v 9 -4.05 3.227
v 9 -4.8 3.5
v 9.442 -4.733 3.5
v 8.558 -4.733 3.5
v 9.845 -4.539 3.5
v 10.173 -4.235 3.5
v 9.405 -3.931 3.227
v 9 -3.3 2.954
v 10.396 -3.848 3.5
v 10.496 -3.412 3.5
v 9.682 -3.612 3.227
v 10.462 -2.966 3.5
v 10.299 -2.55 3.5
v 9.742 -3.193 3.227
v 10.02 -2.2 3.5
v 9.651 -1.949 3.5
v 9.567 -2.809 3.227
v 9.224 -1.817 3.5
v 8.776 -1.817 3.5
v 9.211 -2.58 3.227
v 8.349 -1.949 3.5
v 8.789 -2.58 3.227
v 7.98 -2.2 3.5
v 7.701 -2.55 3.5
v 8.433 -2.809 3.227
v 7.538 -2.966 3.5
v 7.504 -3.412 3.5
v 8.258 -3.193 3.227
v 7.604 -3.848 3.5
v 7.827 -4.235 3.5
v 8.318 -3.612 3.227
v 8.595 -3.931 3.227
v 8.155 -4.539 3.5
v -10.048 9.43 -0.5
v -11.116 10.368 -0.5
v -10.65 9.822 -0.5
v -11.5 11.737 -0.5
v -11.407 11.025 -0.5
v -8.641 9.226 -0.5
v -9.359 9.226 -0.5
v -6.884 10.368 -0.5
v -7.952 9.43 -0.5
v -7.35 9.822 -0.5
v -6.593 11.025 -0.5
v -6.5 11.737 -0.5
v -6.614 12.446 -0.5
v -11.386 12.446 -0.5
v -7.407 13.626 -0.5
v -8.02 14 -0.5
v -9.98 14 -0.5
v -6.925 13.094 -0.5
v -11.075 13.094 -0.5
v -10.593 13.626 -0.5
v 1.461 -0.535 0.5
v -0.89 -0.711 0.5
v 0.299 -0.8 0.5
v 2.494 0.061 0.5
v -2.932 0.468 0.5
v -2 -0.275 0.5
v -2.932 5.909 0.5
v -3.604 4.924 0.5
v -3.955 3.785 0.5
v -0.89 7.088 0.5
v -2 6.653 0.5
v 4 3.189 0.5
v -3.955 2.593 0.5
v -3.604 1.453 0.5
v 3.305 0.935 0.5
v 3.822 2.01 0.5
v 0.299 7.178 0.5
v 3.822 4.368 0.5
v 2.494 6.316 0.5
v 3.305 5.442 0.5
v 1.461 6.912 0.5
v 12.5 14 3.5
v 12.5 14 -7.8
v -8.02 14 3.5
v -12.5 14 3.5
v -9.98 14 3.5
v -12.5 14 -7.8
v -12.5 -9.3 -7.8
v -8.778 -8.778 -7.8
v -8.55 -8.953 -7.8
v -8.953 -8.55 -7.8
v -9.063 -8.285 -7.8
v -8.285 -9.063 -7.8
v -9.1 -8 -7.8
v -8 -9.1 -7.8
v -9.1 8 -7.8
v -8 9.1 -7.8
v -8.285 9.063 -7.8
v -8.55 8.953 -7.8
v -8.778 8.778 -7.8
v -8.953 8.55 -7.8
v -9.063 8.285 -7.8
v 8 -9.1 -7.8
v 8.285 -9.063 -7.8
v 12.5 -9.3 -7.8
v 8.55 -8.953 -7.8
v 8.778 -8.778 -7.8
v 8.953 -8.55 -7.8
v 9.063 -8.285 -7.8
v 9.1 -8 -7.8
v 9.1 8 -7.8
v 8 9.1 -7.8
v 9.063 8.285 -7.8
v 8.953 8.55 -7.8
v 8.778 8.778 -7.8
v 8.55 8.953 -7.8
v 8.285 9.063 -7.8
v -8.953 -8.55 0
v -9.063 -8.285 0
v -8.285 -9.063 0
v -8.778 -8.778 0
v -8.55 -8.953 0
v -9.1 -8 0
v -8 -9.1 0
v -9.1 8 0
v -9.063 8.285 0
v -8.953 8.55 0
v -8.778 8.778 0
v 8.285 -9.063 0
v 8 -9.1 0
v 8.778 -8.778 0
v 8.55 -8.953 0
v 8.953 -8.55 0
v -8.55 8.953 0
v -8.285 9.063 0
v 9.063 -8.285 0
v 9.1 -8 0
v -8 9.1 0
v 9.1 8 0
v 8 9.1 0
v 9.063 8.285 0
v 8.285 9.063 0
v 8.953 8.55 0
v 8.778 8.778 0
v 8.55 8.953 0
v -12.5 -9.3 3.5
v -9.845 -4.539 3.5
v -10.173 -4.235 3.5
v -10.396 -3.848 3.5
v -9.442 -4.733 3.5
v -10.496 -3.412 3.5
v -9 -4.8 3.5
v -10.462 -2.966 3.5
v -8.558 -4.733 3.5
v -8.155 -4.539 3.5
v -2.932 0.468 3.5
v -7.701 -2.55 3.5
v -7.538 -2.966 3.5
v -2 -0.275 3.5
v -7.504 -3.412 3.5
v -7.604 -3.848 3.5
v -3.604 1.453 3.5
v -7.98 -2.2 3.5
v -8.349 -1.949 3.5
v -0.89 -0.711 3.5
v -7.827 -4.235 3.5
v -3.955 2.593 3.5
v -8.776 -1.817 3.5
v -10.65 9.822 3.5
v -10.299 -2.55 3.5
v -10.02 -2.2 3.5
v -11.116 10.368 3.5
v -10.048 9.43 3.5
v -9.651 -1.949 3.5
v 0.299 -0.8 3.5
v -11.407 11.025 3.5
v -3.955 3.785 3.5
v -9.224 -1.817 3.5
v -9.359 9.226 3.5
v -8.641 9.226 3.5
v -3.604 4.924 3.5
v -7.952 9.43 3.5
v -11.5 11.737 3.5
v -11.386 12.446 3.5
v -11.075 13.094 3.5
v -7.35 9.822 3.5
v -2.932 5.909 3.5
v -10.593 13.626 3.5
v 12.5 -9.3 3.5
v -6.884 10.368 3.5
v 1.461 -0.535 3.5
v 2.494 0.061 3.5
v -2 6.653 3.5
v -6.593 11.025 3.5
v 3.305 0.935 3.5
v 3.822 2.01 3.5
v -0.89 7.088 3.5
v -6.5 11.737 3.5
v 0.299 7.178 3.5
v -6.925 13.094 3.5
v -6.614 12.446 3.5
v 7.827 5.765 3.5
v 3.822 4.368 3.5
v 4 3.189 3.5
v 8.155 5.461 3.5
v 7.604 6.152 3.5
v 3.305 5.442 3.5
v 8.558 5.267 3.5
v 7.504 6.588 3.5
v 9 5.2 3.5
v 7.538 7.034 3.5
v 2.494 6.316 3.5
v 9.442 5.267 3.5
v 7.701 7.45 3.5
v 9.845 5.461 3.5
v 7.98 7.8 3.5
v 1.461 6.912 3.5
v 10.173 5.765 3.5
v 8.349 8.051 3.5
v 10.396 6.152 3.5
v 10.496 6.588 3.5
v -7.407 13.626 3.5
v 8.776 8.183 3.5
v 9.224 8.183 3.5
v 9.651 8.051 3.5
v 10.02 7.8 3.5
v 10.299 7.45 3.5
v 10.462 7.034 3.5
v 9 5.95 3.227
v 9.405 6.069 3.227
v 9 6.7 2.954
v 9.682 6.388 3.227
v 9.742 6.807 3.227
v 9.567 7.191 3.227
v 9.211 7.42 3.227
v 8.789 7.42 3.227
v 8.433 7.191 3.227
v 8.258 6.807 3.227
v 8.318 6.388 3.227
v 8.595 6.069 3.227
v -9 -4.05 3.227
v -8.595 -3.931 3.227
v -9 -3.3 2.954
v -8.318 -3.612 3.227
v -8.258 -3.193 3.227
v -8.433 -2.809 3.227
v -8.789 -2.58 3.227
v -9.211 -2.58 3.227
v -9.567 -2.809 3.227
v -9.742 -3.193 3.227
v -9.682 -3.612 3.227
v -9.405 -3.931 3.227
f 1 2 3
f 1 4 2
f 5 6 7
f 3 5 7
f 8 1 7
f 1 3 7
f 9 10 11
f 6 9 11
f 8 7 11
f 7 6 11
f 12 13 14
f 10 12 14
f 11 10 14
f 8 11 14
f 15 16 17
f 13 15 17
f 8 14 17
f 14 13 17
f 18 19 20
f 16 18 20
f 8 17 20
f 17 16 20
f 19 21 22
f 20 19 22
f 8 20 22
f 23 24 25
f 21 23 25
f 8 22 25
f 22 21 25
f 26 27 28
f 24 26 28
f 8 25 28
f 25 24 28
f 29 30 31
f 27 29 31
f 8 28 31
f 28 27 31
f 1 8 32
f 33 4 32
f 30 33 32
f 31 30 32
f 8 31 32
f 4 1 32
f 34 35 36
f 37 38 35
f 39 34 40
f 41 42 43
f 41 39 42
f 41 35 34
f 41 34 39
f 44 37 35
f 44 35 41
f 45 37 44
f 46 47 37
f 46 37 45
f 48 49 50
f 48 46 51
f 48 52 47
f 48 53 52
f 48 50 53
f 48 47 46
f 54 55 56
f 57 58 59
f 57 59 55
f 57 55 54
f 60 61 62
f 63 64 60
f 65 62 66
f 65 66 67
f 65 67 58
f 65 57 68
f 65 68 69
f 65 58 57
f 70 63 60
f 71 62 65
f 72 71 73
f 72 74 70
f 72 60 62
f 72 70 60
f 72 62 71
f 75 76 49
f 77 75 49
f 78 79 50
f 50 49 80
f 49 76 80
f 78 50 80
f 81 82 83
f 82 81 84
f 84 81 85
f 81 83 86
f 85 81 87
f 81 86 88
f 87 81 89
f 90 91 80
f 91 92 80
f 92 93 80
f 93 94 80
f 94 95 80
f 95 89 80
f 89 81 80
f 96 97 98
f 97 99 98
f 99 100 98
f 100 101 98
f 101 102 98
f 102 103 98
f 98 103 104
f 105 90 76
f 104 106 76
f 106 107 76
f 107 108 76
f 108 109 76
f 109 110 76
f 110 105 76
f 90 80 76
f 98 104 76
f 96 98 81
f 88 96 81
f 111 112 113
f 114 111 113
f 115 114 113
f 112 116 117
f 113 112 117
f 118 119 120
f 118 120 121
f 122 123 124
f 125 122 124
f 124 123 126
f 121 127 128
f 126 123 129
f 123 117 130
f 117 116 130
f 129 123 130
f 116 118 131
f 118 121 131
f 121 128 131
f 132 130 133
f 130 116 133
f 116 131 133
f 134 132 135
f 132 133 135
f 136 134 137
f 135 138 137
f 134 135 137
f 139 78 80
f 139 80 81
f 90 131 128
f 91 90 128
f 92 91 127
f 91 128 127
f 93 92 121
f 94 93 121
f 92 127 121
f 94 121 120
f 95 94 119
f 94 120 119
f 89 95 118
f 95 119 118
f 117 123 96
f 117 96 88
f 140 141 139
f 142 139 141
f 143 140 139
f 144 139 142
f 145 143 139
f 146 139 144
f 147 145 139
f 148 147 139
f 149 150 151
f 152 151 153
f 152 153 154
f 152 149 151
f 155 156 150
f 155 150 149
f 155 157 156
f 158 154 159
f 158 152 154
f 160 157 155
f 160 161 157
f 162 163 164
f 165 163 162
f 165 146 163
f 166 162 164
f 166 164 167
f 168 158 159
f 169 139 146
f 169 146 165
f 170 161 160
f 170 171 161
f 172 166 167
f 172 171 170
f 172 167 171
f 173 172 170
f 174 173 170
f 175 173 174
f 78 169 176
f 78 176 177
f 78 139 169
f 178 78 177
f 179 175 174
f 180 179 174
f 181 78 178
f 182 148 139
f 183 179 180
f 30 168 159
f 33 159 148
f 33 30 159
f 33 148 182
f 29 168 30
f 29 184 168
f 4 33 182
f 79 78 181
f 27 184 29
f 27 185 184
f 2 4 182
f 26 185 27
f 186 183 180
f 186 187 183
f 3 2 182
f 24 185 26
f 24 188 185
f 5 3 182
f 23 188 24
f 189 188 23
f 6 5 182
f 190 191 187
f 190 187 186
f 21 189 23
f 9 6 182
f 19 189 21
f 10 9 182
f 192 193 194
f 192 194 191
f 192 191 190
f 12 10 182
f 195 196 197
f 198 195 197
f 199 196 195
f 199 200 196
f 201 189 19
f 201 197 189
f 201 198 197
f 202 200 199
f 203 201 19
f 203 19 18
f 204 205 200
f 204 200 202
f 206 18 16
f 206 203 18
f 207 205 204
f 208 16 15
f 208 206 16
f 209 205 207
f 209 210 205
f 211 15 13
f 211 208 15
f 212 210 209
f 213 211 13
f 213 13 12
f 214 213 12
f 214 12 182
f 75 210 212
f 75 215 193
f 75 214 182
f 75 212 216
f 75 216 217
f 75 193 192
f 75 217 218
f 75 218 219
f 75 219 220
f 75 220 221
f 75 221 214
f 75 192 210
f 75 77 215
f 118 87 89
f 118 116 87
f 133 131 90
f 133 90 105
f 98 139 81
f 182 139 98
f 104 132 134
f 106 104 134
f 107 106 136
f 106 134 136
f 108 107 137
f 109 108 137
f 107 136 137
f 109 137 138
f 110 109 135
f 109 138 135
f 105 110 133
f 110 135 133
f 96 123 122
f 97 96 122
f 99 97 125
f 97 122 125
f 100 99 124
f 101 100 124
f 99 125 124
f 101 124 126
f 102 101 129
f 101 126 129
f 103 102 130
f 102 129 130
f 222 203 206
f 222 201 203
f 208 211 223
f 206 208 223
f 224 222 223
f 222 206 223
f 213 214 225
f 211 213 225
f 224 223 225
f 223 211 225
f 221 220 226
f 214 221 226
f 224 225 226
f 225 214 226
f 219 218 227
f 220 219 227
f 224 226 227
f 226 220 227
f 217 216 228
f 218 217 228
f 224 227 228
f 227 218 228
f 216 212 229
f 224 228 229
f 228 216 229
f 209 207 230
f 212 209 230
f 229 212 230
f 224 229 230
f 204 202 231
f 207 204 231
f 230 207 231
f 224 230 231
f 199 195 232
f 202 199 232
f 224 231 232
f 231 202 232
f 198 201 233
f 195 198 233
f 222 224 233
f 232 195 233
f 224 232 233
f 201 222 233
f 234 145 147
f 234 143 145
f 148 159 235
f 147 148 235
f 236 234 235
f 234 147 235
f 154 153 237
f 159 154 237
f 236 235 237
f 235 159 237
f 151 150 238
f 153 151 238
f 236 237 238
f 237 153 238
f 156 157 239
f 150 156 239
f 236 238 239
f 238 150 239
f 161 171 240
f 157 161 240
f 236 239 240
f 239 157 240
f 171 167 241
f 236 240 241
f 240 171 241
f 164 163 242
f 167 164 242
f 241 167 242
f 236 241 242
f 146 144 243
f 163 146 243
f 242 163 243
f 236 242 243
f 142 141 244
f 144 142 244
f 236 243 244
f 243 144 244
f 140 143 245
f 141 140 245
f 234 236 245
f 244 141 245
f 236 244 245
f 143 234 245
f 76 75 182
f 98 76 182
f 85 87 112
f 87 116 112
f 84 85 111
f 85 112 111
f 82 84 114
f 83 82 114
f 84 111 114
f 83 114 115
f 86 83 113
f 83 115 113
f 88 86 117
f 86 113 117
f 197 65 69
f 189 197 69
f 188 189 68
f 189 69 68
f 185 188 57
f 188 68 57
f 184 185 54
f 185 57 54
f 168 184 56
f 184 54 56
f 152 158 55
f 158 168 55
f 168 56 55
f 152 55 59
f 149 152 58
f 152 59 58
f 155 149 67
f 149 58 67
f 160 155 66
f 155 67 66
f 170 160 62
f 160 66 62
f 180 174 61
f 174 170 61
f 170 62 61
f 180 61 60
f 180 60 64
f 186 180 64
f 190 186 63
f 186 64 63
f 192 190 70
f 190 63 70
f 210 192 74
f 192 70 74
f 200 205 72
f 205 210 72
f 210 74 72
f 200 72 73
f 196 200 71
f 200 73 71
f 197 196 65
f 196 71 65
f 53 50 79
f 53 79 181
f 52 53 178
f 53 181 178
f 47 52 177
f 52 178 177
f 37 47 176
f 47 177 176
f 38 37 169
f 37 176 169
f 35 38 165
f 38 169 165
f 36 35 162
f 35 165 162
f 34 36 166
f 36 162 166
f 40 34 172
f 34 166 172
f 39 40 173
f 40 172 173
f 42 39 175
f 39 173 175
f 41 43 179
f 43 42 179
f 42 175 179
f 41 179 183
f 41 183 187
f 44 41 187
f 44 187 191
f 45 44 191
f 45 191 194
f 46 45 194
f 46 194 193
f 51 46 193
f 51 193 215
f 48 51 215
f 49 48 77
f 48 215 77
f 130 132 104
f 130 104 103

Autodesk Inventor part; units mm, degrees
ref_plane "YZ Plane" through (0, 0, 0) normal (1, 0, 0) x (0, 1, 0)
ref_plane "XZ Plane" through (0, 0, 0) normal (0, 1, 0) x (-1, 0, 0)
sketch "Skizze1" plane through (0, 0, 0) normal (0, 0, 1) x (1, 0, 0)
  arc A0 (-9, -8) -> (-8, -9) centre (-8, -8) ccw projected
  line L0 (8, -9) -> (-8, -9) projected
  arc A1 (8, -9) -> (9, -8) centre (8, -8) ccw projected
  line L1 (9, 8) -> (9, -8) projected
  arc A2 (9, 8) -> (8, 9) centre (8, 8) ccw projected
  line L2 (-8, 9) -> (8, 9) projected
  arc A3 (-8, 9) -> (-9, 8) centre (-8, 8) ccw projected
  line L3 (-9, -8) -> (-9, 8) projected
  circle A4 centre (0, 0) radius 5.8 projected
  arc A5 (-8, 9.1) -> (-9.1, 8) centre (-8, 8) ccw
  line L4 (-8, 9.1) -> (8, 9.1)
  arc A6 (9.1, 8) -> (8, 9.1) centre (8, 8) ccw
  line L5 (9.1, 8) -> (9.1, -8)
  arc A7 (8, -9.1) -> (9.1, -8) centre (8, -8) ccw
  line L6 (8, -9.1) -> (-8, -9.1)
  arc A8 (-9.1, -8) -> (-8, -9.1) centre (-8, -8) ccw
  line L7 (-9.1, -8) -> (-9.1, 8)
  line L8 (14, 14) -> (-14, 14)
  line L9 (-14, 14) -> (-14, -14)
  line L10 (-14, -14) -> (14, -14)
  line L11 (14, -14) -> (14, 14)
  line L12 (14, 14) -> (-14, -14) construction
  line L13 (-14, 14) -> (14, -14) construction
  point P0 (0, 0)
  dimension "d0" = 0.1
  dimension "d1" = 28
  dimension "d2" = 28
ref_plane "Arbeitsebene1" through (-9, -9, -7.8) normal (0, 0, -1) x (0, 1, 0)
extrude "Extrusion1" add sketch "Skizze1" against normal up to surface (7.8 mm away) contours L11 L10 L9 L8
sketch "Skizze2" plane through (0, 0, 0) normal (0, 0, 1) x (1, 0, 0)
  line L0 (-14, 14) -> (-14, -14) projected
  line L1 (-14, -14) -> (14, -14) projected
  line L2 (14, -14) -> (14, 14) projected
  line L3 (14, 14) -> (-14, 14) projected
  line L4 (9.1, 8) -> (9.1, -8) projected
  arc A0 (8, -9.1) -> (9.1, -8) centre (8, -8) ccw projected
  line L5 (8, -9.1) -> (-8, -9.1) projected
  arc A1 (-9.1, -8) -> (-8, -9.1) centre (-8, -8) ccw projected
  line L6 (-9.1, -8) -> (-9.1, 8) projected
  arc A2 (-8, 9.1) -> (-9.1, 8) centre (-8, 8) ccw projected
  line L7 (-8, 9.1) -> (8, 9.1) projected
  arc A3 (9.1, 8) -> (8, 9.1) centre (8, 8) ccw projected
  line L8 (-7.6, 7.6) -> (-7.6, -7.6)
  line L9 (-7.6, -7.6) -> (7.6, -7.6)
  line L10 (7.6, -7.6) -> (7.6, 7.6)
  line L11 (7.6, 7.6) -> (-7.6, 7.6)
  point P0 (0, 0)
  dimension "d5" = 1.5
extrude "Extrusion2" add sketch "Skizze2" along normal blind 0.5 contours L3 L2 L1 L0 | L4 A0 L5 A1 L6 A2 L7 A3 | L11 L10 L9 L8
sketch "Skizze3" plane through (0, 0, 0.5) normal (0, 0, 1) x (1, 0, 0)
  line L0 (-14, -14) -> (14, -14) projected
  line L1 (14, -14) -> (14, 14) projected
  line L2 (14, 14) -> (-14, 14) projected
  line L3 (-14, 14) -> (-14, -14) projected
  circle A0 centre (0, 3.1887) radius 4
  dimension "d8" = 8
extrude "Extrusion3" add sketch "Skizze3" along normal blind 3
sketch "Skizze4" plane through (0, 0, 3.5) normal (0, 0, 1) x (1, 0, 0)
  line L0 (14, -14) -> (14, 14) projected
  line L1 (14, 14) -> (-14, 14) projected
  line L2 (-14, 14) -> (-14, -14) projected
  line L3 (-14, -14) -> (14, -14) projected
  circle A0 centre (0, 3.1887) radius 4 projected
  line L4 (5, -10.8) -> (-5, -10.8) projected
  line L5 (-14, 14) -> (-14, -14) projected
  line L6 (14, -14) -> (-14, -14)
  line L7 (-14, -14) -> (-14, -9.3)
  line L8 (-14, -9.3) -> (14, -9.3)
  line L9 (14, -9.3) -> (14, -14)
  line L10 (-14, 14) -> (-12.5, 14)
  line L11 (-12.5, 14) -> (-12.5, -9.3)
  line L12 (-12.5, -9.3) -> (-14, -9.3)
  line L13 (-14, -9.3) -> (-14, 14)
  line L14 (14, -14) -> (14, 14) projected
  line L15 (14, 14) -> (12.5, 14)
  line L16 (12.5, 14) -> (12.5, -9.3)
  line L17 (12.5, -9.3) -> (14, -9.3)
  line L18 (14, -9.3) -> (14, 14)
  point P0 (0, 0)
  point P1 (14, -9.3)
  point P2 (12.5, 14)
  dimension "d11" = 1.5
  dimension "d22" = 1.5
  dimension "d23" = 1.5
extrude "Extrusion4" cut sketch "Skizze4" against normal through all contours L3 L2 L8 L0 | L8 L16 L1 L0 | L2 L1 L11 L8
sketch "Skizze5" plane through (0, 0, 3.5) normal (0, 0, 1) x (1, 0, 0)
  circle A0 centre (-9, 11.7) radius 2 projected
  circle A1 centre (-9, -3.3) radius 2.5019 projected
  line L0 (-9, -3.3) -> (9, -3.3)
  line L1 (9, -3.3) -> (9, 6.7)
  line L2 (9, 6.7) -> (-9, 6.7)
  line L3 (-9, 6.7) -> (-9, -3.3)
  dimension "d25" = 18
hole "Bohrung1" at (9, -3.3, 3.5) at (9, 6.7, 3.5) at (-9, -3.3, 3.5) at (-9, 11.7, 3.5) direction (0, 0, -1) diameter 3 depth 0.0001 tip angle 140
sketch "Skizze6" plane through (0, 0, 3.5) normal (0, 0, 1) x (1, 0, 0)
  circle A0 centre (-9, 11.7) radius 1.5 projected
  circle A1 centre (-9, 11.7) radius 2.5
  point P0 (0, 0)
  dimension "d26" = 5
extrude "Extrusion5" cut sketch "Skizze6" against normal blind 4 contours A0 | A1
properties part number "10_SOOCT_VCM_Mount_v0"
